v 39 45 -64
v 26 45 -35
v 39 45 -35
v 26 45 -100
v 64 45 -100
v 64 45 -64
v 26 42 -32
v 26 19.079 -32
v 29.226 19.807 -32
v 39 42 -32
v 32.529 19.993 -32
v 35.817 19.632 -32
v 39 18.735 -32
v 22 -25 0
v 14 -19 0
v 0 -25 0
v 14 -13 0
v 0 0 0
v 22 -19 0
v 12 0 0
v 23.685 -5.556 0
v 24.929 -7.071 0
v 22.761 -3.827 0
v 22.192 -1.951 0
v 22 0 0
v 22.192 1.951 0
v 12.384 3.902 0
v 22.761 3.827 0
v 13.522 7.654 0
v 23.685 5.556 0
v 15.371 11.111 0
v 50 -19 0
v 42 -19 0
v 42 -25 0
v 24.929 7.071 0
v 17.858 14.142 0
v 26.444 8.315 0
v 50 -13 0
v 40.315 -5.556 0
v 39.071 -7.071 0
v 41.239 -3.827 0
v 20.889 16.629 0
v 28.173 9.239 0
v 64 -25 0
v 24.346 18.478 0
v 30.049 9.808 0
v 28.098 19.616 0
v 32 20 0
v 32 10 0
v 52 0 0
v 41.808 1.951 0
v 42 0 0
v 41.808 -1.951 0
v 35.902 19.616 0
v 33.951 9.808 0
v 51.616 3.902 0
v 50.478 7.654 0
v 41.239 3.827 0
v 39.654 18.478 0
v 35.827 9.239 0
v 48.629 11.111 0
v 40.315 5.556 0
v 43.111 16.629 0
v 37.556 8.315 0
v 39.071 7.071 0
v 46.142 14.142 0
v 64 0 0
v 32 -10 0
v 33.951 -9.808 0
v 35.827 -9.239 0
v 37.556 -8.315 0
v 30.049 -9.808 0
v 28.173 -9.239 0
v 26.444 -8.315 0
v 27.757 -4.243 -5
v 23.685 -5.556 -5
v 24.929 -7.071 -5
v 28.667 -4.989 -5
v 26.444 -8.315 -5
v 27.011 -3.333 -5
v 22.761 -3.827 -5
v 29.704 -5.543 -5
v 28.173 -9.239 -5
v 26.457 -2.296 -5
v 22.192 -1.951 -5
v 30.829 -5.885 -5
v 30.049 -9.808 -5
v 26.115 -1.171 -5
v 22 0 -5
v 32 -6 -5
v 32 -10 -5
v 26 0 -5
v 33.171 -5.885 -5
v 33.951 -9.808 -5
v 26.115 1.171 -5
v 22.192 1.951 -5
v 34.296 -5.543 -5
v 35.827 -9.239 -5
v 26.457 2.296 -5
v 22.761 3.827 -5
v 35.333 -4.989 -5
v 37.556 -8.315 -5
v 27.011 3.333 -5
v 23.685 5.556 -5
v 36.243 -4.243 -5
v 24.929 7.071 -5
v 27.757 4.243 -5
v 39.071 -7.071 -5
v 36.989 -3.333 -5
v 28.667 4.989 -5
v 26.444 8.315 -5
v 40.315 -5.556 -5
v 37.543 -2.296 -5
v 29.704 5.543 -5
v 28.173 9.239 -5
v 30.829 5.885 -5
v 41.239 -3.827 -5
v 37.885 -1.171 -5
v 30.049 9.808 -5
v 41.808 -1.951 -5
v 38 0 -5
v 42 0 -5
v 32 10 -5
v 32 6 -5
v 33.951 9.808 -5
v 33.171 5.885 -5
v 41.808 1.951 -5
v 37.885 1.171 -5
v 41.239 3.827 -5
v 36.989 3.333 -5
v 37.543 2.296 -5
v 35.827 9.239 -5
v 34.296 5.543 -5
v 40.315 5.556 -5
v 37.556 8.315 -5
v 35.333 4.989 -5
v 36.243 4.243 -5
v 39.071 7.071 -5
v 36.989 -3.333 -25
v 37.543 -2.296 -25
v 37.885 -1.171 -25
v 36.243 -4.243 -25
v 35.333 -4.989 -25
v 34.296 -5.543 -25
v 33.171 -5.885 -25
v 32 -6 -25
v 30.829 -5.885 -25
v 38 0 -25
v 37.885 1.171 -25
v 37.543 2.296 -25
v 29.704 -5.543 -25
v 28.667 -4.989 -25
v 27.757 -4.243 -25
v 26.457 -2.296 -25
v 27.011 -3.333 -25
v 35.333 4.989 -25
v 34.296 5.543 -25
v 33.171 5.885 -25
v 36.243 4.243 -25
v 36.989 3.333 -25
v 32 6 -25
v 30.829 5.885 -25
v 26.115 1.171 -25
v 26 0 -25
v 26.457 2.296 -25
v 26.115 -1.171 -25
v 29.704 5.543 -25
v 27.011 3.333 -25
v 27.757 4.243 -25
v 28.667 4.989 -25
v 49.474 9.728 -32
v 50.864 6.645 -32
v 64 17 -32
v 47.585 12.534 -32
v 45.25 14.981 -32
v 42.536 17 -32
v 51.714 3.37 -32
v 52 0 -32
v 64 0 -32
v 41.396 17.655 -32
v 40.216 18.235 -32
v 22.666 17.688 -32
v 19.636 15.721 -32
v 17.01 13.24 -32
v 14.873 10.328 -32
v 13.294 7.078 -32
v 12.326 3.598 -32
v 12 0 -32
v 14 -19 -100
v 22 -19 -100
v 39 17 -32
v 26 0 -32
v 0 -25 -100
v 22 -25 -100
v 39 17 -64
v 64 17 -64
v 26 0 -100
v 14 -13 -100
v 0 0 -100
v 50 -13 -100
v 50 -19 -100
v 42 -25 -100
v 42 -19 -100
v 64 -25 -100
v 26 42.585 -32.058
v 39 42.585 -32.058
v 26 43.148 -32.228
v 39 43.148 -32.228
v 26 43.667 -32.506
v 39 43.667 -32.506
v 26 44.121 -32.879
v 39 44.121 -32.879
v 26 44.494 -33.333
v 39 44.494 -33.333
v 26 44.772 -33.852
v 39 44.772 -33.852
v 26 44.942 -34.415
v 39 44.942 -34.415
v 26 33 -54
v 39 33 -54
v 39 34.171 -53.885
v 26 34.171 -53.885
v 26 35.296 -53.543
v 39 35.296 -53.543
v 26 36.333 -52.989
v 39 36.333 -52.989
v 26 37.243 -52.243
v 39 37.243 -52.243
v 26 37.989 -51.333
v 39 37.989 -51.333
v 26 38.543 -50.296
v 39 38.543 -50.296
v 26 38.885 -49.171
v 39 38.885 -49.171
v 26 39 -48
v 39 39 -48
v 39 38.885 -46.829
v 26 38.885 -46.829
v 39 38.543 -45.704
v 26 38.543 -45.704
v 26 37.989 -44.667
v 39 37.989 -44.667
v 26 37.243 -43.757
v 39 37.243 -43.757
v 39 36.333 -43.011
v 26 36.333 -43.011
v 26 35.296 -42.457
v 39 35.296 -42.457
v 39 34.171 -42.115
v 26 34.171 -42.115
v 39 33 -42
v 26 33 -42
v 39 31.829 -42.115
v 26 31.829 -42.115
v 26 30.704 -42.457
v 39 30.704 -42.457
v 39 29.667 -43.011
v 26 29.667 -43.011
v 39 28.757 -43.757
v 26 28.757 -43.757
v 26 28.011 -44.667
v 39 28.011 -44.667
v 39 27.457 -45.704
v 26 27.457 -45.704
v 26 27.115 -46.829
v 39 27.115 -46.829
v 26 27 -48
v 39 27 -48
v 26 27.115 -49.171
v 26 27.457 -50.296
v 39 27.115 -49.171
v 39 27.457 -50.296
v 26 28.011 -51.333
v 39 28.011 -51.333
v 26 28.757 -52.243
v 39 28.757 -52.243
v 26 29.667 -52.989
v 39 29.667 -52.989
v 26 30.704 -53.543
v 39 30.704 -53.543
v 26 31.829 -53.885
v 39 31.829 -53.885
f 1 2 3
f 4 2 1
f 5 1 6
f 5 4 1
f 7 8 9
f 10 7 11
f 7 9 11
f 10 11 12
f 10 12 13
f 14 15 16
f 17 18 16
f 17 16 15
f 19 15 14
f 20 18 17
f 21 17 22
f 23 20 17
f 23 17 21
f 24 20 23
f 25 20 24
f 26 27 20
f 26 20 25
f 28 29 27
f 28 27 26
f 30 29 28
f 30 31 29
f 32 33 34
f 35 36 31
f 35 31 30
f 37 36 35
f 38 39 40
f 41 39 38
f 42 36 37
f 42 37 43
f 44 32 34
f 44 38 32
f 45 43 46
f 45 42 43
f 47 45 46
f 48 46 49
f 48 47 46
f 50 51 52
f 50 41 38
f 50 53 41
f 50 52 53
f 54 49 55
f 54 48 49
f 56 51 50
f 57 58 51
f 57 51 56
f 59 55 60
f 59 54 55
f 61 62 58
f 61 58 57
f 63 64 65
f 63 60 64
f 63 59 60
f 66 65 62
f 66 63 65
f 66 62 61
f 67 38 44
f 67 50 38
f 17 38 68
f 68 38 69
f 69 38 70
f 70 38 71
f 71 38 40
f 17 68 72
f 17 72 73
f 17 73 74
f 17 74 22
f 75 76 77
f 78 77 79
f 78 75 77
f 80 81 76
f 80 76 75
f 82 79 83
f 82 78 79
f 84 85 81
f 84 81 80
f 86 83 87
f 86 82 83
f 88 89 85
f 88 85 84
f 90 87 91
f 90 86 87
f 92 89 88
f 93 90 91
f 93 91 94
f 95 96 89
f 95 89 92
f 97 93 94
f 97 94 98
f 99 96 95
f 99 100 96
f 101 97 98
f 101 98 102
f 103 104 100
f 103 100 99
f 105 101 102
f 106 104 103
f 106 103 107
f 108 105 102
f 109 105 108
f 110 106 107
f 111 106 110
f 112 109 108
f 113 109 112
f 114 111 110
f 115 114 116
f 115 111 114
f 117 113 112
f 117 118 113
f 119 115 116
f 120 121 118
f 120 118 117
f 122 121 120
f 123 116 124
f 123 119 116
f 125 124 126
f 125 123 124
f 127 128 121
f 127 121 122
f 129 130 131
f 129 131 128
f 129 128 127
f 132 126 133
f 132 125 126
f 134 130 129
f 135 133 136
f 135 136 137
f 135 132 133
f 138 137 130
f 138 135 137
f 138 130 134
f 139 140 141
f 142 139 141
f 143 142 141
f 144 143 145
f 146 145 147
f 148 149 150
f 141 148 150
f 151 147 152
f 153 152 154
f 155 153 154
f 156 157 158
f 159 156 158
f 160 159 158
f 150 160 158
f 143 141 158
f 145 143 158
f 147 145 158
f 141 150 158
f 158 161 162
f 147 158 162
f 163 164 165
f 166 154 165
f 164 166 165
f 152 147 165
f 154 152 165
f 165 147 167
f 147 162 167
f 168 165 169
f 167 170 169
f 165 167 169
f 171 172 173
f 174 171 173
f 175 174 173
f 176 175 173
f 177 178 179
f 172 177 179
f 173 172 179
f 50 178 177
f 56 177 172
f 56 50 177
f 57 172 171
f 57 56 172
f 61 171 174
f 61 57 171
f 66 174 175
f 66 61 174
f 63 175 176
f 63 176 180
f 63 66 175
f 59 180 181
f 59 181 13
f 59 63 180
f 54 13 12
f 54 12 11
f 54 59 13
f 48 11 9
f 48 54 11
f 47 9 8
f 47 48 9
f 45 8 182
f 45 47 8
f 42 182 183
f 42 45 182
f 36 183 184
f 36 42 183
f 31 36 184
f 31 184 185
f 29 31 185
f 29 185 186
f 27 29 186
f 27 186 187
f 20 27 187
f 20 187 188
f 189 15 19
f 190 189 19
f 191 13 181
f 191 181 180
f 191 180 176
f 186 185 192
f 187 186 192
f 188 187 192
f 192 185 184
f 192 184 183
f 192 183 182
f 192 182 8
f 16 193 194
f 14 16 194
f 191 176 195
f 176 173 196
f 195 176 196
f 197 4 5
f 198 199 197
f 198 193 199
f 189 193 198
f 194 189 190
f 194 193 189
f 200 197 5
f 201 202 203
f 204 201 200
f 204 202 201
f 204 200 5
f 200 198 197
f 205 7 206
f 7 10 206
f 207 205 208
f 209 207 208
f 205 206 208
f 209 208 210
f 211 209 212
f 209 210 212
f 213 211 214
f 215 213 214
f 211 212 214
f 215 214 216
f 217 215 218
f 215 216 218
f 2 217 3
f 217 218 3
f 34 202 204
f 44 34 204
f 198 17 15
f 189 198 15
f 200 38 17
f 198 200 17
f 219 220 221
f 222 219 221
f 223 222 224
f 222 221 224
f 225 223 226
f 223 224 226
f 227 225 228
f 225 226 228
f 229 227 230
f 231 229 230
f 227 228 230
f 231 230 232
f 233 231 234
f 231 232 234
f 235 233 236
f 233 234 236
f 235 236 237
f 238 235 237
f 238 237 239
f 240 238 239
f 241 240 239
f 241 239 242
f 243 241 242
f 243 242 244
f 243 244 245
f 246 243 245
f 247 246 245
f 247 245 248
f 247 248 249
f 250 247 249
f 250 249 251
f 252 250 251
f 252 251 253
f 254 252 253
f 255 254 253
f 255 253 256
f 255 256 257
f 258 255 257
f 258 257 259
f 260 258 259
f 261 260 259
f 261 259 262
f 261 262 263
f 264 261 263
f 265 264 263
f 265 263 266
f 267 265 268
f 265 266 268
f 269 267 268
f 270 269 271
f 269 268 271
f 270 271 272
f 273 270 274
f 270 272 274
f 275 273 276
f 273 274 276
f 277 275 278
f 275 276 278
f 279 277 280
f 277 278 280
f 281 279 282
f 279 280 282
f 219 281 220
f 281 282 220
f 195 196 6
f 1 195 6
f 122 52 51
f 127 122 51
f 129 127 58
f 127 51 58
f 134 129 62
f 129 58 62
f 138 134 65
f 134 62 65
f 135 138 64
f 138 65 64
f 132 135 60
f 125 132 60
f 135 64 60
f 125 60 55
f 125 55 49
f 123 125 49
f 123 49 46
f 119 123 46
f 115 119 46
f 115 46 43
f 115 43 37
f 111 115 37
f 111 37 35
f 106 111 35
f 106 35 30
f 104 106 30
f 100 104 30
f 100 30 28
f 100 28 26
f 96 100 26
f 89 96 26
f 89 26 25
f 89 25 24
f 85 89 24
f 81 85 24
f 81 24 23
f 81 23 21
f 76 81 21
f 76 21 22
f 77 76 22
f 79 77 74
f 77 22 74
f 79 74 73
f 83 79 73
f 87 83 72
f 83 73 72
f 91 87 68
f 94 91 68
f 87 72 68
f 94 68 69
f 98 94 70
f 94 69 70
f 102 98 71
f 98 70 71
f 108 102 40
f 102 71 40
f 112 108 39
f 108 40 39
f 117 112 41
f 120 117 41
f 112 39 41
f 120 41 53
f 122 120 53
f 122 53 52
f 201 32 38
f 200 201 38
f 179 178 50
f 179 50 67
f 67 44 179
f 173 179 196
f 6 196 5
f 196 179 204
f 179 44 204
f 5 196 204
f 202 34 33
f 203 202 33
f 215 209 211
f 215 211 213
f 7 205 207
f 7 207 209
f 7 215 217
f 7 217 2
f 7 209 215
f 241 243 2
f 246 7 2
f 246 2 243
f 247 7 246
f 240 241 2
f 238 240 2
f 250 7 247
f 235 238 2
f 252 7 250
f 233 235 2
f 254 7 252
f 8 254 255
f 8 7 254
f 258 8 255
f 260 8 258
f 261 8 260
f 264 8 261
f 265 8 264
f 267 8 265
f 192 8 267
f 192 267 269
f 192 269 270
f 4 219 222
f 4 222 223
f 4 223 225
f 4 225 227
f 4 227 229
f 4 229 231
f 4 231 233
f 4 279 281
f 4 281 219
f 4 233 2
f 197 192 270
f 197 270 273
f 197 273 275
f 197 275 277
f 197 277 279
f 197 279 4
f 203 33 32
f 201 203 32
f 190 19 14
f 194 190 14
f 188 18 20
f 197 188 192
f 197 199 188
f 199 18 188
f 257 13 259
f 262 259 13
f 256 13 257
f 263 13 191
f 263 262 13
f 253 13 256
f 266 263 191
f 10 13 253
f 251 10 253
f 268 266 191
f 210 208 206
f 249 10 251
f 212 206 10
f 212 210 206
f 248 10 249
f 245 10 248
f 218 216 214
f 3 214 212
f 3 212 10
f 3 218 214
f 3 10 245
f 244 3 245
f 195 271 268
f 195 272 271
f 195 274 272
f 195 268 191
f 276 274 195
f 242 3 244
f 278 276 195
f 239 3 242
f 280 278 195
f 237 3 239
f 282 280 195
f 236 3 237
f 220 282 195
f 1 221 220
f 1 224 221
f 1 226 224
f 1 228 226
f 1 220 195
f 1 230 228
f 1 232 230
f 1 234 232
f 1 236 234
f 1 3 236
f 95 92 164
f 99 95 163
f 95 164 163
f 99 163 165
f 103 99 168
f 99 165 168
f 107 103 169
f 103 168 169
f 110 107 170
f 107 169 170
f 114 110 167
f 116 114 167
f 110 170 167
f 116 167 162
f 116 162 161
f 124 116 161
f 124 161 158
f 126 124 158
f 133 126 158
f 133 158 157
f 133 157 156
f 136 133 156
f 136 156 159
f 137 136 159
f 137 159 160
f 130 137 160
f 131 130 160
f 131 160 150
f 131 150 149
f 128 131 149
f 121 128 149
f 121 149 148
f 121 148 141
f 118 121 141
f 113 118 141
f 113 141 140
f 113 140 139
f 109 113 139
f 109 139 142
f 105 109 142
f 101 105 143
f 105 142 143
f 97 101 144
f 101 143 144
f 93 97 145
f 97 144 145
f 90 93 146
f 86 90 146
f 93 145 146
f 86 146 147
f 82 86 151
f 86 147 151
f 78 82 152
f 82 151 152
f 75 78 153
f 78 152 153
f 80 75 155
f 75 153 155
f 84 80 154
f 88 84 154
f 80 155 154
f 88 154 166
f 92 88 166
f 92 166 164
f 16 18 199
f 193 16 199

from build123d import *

# Parameters (mm, degrees)
SKETCH1_W                                    = 64
SKETCH1_H                                    = 100
BOSS_EXTRUDE1_DEPTH                          = 25
SKETCH2_W                                    = 38
SKETCH2_H                                    = 68
BOSS_EXTRUDE2_DEPTH                          = 45
SKETCH3_W                                    = 32
SKETCH3_H                                    = 28
CUT_EXTRUDE1_DEPTH                           = 25
BOSS_EXTRUDE3_DEPTH                          = 32
CUT_EXTRUDE2_DEPTH                           = 127.968500031
FILLET1_R                                    = 3
CBORE_FOR_M10_CHEESE_HEAD_SCREW1_D           = 12
CBORE_FOR_M10_CHEESE_HEAD_SCREW1_DEPTH       = 25
CBORE_FOR_M10_CHEESE_HEAD_SCREW1_CBORE_D     = 20
CBORE_FOR_M10_CHEESE_HEAD_SCREW1_CBORE_DEPTH = 5
SKETCH7_R                                    = 6
CUT_EXTRUDE3_DEPTH                           = 117.387284529


with BuildPart() as part:
    # Sketch1 → Boss-Extrude1 (new body)
    with BuildSketch(Plane(origin=(0, 0, 0), x_dir=(1, 0, 0), z_dir=(0, 1, 0))):
        with Locations((32, 50)):
            Rectangle(SKETCH1_W, SKETCH1_H)
    extrude(amount=-BOSS_EXTRUDE1_DEPTH)

    # Sketch2 → Boss-Extrude2 (add)
    with BuildSketch(Plane(origin=(0, 0, 0), x_dir=(1, 0, 0), z_dir=(0, 1, 0))):
        with Locations((45, 66)):
            Rectangle(SKETCH2_W, SKETCH2_H)
    extrude(amount=BOSS_EXTRUDE2_DEPTH)

    # Sketch3 → Cut-Extrude1 (cut)
    with BuildSketch(Plane(origin=(64, 0, 0), x_dir=(0, 0, -1), z_dir=(1, 0, 0))):
        with Locations((48, 31)):
            Rectangle(SKETCH3_W, SKETCH3_H)
    extrude(amount=-CUT_EXTRUDE1_DEPTH, mode=Mode.SUBTRACT)

    # Sketch4 → Boss-Extrude3 (add)
    with BuildSketch(Plane.XY):
        with BuildLine():
            ThreePointArc((52, 0), (32, 20), (12, 0))
            Line((12, 0), (52, 0))
        make_face()
    extrude(amount=-BOSS_EXTRUDE3_DEPTH)

    # Sketch4<3> → Cut-Extrude2 (cut, through all)
    with BuildSketch(Plane.XY):
        Polygon((22, -19), (22, -25), (42, -25), (42, -19), (50, -19), (50, -13), (14, -13), (14, -19), align=None)
    extrude(amount=-CUT_EXTRUDE2_DEPTH, mode=Mode.SUBTRACT)

    # Fillet1
    fillet1_edges = [part.edges().sort_by_distance(p)[0] for p in [
        (32.5, 45, -32),
    ]]
    fillet(fillet1_edges, radius=FILLET1_R)

    # CBORE for M10 Cheese Head Screw1
    with Locations(Plane.XY):
        with Locations((32, 0)):
            CounterBoreHole(CBORE_FOR_M10_CHEESE_HEAD_SCREW1_D / 2, CBORE_FOR_M10_CHEESE_HEAD_SCREW1_CBORE_D / 2, CBORE_FOR_M10_CHEESE_HEAD_SCREW1_CBORE_DEPTH, depth=CBORE_FOR_M10_CHEESE_HEAD_SCREW1_DEPTH)

    # Sketch7 → Cut-Extrude3 (cut, through all)
    with BuildSketch(Plane(origin=(39, 0, 0), x_dir=(0, 0, -1), z_dir=(1, 0, 0))):
        with Locations((48, 33)):
            Circle(SKETCH7_R)
    extrude(amount=-CUT_EXTRUDE3_DEPTH, mode=Mode.SUBTRACT)


solid = part.part
